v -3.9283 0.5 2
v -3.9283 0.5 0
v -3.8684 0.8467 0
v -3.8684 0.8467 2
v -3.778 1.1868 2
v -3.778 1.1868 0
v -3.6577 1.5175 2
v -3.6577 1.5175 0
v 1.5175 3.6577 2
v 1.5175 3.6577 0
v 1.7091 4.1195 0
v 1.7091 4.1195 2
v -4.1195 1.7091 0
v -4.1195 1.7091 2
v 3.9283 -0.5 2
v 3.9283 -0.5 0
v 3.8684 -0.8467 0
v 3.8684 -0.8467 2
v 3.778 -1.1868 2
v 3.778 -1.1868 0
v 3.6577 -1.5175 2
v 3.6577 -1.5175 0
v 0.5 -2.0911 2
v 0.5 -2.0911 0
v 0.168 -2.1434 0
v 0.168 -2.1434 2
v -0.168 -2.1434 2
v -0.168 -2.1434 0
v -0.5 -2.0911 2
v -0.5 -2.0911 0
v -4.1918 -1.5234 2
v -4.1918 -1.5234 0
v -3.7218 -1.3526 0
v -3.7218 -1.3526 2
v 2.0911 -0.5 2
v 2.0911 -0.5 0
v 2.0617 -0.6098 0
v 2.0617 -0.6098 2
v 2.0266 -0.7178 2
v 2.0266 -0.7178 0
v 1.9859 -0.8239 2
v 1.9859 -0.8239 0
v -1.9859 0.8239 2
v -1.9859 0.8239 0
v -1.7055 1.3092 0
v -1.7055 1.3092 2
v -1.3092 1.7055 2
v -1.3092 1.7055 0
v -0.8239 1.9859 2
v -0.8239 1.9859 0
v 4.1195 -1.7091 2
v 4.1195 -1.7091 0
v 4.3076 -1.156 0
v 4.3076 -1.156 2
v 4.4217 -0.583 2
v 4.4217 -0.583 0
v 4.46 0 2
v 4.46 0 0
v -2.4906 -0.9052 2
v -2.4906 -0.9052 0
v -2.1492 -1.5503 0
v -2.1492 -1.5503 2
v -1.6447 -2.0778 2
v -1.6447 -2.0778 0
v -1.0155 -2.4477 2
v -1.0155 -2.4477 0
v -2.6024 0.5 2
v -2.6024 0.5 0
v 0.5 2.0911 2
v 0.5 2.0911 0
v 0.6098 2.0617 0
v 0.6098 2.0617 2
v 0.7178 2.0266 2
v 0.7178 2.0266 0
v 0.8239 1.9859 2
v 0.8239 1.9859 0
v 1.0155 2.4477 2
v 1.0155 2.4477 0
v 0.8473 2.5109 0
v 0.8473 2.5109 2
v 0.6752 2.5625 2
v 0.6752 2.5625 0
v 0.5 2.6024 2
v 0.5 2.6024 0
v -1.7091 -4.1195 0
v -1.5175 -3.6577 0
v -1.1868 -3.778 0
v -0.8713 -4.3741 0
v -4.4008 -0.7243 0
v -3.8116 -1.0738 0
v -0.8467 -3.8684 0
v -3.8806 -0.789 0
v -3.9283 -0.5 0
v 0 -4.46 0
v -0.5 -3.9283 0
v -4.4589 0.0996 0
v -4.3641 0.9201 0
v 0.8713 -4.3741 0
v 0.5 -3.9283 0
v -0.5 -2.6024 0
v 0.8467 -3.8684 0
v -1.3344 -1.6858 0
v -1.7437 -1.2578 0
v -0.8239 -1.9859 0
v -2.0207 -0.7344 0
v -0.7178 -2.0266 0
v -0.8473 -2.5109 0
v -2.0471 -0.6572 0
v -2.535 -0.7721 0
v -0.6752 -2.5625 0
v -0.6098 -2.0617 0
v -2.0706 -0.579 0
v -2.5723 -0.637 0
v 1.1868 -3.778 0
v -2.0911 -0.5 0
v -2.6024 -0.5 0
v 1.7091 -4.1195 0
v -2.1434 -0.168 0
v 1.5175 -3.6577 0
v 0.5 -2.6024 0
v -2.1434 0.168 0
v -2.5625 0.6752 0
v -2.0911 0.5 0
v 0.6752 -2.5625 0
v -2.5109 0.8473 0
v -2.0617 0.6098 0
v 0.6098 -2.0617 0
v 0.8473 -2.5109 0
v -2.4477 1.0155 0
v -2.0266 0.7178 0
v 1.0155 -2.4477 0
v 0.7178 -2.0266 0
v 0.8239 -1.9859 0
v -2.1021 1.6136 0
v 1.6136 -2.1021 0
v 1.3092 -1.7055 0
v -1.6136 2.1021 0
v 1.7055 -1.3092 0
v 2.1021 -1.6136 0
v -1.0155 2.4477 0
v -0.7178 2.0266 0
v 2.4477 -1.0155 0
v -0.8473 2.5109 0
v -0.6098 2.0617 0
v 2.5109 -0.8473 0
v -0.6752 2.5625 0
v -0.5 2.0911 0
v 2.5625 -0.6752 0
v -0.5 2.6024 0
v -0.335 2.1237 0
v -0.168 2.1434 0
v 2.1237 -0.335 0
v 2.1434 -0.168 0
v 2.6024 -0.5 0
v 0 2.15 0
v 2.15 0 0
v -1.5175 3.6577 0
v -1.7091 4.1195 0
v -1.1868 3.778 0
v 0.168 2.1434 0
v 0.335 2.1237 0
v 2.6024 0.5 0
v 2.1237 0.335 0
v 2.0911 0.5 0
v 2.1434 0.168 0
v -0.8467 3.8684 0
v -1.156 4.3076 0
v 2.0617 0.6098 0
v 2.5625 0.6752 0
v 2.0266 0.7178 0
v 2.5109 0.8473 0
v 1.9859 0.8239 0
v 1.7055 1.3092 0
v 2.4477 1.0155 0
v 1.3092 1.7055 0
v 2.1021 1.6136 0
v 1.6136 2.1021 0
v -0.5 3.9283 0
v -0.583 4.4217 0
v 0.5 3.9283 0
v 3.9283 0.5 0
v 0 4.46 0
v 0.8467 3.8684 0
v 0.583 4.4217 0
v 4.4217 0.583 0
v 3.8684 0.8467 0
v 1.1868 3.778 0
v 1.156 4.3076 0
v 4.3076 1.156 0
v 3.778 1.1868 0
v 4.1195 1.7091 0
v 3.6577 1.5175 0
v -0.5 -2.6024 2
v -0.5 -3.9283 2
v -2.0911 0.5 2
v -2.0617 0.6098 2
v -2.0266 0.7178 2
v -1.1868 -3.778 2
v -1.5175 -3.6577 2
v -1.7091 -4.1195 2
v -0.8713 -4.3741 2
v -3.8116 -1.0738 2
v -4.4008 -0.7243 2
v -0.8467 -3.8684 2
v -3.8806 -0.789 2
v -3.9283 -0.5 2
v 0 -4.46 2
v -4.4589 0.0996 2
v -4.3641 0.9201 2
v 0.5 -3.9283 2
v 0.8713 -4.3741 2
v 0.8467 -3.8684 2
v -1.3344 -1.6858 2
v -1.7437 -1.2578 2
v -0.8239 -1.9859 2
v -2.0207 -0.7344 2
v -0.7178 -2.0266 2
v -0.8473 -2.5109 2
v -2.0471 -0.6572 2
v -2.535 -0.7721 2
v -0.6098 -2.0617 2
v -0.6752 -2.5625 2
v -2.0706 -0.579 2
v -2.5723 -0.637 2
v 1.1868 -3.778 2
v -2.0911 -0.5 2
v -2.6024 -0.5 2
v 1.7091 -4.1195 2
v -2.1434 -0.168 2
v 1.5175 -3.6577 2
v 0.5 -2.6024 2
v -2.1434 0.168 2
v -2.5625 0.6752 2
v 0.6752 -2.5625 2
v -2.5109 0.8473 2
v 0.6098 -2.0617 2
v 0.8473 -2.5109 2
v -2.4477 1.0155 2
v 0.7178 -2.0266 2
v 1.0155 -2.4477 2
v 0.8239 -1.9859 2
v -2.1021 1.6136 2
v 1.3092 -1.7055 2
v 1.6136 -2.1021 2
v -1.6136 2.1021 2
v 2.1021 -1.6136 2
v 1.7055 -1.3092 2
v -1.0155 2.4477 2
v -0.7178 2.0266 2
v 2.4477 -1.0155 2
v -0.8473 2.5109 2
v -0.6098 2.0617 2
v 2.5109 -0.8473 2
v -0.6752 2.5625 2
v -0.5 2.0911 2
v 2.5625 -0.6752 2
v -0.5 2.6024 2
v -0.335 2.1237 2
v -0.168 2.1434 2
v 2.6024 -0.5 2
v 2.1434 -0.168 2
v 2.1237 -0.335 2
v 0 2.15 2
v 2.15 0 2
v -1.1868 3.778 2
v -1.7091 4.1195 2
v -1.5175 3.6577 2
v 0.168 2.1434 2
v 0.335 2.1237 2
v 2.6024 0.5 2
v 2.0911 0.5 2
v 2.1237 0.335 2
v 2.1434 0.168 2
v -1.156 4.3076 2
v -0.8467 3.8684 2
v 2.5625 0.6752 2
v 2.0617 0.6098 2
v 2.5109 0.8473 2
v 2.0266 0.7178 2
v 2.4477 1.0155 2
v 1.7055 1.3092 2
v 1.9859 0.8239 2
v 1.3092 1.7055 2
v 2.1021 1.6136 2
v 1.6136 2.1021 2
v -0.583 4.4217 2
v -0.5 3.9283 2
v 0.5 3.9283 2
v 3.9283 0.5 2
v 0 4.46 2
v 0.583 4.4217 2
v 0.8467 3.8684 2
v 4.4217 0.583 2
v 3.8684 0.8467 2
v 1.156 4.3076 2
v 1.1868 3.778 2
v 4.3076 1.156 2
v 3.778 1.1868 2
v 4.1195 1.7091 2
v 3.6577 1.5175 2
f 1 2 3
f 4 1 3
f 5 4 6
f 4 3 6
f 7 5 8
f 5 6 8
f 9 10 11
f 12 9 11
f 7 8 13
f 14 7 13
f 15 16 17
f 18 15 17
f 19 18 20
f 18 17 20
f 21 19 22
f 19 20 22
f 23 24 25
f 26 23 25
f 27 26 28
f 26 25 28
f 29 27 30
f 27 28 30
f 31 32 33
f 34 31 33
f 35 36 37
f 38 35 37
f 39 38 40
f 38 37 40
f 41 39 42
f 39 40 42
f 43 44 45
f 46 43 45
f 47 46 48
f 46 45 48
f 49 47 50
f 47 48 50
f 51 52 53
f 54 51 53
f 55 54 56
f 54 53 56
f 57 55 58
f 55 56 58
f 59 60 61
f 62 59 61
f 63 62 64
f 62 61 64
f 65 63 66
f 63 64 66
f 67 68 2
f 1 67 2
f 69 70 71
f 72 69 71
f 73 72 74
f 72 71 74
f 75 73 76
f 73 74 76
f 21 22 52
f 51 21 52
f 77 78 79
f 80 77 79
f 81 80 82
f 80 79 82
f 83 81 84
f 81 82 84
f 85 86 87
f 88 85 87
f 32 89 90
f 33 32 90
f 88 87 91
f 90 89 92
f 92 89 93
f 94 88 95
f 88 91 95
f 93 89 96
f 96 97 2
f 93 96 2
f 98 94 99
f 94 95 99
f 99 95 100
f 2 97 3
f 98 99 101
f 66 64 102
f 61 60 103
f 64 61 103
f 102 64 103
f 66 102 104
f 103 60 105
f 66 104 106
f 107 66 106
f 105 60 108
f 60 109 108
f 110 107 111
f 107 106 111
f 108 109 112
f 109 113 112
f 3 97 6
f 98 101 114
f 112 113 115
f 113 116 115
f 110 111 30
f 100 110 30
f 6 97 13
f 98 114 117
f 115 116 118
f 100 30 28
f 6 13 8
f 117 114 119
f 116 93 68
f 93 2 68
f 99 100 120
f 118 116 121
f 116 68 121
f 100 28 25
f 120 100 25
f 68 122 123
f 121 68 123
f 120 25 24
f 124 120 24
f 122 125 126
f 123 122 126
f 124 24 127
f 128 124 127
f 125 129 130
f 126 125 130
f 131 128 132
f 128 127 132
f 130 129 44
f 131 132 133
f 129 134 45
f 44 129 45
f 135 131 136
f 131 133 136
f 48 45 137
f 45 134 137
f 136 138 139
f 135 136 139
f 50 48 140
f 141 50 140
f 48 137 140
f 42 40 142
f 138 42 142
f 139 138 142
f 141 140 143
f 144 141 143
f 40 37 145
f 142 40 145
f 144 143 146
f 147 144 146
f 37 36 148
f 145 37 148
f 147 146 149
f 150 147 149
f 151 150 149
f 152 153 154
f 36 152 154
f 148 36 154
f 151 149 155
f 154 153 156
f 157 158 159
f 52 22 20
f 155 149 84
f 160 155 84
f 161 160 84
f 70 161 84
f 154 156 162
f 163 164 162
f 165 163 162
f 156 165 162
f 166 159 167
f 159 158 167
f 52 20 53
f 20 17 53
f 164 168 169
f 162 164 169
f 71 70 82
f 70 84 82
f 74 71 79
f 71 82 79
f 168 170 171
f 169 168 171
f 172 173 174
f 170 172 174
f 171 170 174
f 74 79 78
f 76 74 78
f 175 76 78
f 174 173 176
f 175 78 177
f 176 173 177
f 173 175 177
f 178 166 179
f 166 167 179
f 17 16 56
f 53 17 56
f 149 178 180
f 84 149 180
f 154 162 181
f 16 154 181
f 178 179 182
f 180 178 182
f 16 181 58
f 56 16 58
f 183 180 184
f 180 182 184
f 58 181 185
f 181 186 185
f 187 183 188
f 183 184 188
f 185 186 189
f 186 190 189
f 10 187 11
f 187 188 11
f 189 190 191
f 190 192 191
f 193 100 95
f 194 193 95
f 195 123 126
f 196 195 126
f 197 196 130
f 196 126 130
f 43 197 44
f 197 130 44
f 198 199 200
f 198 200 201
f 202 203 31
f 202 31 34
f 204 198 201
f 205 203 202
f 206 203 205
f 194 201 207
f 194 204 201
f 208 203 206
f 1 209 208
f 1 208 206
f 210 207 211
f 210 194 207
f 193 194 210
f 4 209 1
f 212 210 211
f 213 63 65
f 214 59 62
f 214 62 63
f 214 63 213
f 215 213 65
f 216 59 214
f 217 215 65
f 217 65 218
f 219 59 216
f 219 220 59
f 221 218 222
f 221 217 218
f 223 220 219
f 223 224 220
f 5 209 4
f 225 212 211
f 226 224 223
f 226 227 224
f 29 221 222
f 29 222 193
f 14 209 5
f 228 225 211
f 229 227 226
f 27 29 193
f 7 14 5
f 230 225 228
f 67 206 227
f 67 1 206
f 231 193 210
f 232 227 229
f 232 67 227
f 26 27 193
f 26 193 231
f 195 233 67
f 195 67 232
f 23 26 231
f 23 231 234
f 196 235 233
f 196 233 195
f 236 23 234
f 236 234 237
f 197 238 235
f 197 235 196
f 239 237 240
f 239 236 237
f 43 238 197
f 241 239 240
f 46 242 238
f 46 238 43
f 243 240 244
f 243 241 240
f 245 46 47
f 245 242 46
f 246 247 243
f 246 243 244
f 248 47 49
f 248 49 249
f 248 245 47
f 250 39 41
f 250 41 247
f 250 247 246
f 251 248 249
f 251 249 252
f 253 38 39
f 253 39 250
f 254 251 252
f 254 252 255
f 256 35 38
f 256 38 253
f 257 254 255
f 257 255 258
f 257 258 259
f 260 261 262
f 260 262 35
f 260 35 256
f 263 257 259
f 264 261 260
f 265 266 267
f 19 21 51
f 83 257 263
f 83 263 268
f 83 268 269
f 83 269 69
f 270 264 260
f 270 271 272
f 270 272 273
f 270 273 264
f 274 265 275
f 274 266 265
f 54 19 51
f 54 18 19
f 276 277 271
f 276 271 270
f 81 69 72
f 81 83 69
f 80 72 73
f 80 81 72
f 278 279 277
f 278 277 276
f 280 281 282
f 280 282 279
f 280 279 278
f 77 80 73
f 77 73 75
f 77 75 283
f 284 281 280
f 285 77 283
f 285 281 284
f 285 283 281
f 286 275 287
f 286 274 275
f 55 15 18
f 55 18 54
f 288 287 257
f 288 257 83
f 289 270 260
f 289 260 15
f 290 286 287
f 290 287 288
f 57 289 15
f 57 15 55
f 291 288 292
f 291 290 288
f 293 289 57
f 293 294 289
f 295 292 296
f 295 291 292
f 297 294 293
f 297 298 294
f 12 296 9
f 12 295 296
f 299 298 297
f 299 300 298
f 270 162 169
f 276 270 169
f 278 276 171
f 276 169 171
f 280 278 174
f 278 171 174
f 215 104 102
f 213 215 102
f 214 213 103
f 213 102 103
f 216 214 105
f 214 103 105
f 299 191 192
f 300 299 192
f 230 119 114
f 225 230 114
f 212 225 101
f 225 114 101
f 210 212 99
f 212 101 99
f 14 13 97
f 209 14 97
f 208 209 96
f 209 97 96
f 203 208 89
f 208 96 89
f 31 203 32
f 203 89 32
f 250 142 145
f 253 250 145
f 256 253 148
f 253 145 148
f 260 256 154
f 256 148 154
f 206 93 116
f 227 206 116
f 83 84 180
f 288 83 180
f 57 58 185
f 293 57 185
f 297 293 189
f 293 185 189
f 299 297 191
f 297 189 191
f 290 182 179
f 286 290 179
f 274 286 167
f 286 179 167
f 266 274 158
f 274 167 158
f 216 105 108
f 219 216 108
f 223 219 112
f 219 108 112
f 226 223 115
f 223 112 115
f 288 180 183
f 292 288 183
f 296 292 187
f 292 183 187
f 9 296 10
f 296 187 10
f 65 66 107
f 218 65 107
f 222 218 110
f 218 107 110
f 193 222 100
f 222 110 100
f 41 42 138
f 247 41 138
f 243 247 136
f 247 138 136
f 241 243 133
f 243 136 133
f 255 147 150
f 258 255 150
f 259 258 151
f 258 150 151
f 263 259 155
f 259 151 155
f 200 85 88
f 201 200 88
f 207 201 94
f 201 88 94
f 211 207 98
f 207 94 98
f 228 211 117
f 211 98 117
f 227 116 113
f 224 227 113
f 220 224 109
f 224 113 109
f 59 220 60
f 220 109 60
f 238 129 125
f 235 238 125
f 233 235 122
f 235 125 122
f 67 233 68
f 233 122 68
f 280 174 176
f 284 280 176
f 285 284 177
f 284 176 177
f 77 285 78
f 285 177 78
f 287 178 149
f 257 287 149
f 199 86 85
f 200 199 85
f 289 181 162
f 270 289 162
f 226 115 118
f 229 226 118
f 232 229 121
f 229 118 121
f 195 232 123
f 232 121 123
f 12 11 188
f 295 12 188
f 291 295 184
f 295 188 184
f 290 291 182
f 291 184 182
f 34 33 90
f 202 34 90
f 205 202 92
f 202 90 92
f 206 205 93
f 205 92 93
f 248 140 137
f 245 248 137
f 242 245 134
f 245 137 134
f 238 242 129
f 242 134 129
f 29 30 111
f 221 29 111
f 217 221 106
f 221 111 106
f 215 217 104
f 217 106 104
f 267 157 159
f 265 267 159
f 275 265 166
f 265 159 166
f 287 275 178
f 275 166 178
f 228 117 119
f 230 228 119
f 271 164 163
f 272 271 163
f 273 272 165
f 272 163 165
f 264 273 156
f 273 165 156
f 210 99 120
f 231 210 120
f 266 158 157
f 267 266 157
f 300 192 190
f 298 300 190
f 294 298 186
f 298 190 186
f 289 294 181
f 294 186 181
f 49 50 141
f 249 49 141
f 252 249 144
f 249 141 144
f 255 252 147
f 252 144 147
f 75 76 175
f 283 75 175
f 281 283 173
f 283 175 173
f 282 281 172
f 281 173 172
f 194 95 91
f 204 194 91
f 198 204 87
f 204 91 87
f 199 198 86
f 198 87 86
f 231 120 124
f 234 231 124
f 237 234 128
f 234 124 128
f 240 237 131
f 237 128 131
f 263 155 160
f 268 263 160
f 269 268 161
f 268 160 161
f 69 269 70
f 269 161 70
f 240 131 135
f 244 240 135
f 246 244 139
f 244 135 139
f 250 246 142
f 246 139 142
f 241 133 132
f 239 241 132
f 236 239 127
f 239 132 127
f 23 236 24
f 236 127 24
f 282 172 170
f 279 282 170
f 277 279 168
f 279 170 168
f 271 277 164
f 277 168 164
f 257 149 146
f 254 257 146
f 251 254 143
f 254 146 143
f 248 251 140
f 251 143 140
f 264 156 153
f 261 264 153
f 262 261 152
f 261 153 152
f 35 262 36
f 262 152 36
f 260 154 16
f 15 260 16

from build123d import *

# Parameters (mm, degrees)
F1_DEPTH = 2


with BuildPart() as f1:
    # F0 (on Top) → F1 (new body)
    with BuildSketch(Plane.XY):
        with BuildLine():
            ThreePointArc((0.5, 3.9283075236), (1.0177847027, 3.8269719491), (1.5175023316, 3.6577023763))
            Line((1.5175023316, 3.6577023763), (1.7091061614, 4.1195334844))
            ThreePointArc((1.7091061614, 4.1195334844), (0.871343979, 4.3740552889), (0, 4.46))
            Line((0, 4.46), (0, 3.96))
            ThreePointArc((0, 3.96), (0.2505017031, 3.9520689388), (0.5, 3.9283075236))
        make_face()
        with BuildLine():
            ThreePointArc((-0.5, 3.9283075236), (-0.2505017031, 3.9520689388), (0, 3.96))
            Line((0, 3.96), (0, 4.46))
            ThreePointArc((0, 4.46), (-0.871343979, 4.3740552889), (-1.7091061614, 4.1195334844))
            Line((-1.7091061614, 4.1195334844), (-1.5175023316, 3.6577023763))
            ThreePointArc((-1.5175023316, 3.6577023763), (-1.0177847027, 3.8269719491), (-0.5, 3.9283075236))
        make_face()
        with BuildLine():
            ThreePointArc((-0.5, 2.6024027359), (-0.2511301951, 2.6380738475), (0, 2.65))
            Line((0, 2.65), (0, 3.96))
            ThreePointArc((0, 3.96), (-0.2505017031, 3.9520689388), (-0.5, 3.9283075236))
            Line((-0.5, 3.9283075236), (-0.5, 2.6024027359))
        make_face()
        with BuildLine():
            ThreePointArc((0, 2.65), (0.2511301951, 2.6380738475), (0.5, 2.6024027359))
            Line((0.5, 2.6024027359), (0.5, 3.9283075236))
            ThreePointArc((0.5, 3.9283075236), (0.2505017031, 3.9520689388), (0, 3.96))
            Line((0, 3.96), (0, 2.65))
        make_face()
        with BuildLine():
            ThreePointArc((0, 2.15), (0.2517314161, 2.1352122363), (0.5, 2.0910523666))
            Line((0.5, 2.0910523666), (0.5, 2.6024027359))
            ThreePointArc((0.5, 2.6024027359), (0.2511301951, 2.6380738475), (0, 2.65))
            Line((0, 2.65), (0, 2.15))
        make_face()
        with BuildLine():
            ThreePointArc((-0.5, 2.0910523666), (-0.2517314161, 2.1352122363), (0, 2.15))
            Line((0, 2.15), (0, 2.65))
            ThreePointArc((0, 2.65), (-0.2511301951, 2.6380738475), (-0.5, 2.6024027359))
            Line((-0.5, 2.6024027359), (-0.5, 2.0910523666))
        make_face()
        with BuildLine():
            ThreePointArc((-0.8238964679, 1.9858737649), (-0.6640339592, 2.0448860362), (-0.5, 2.0910523666))
            Line((-0.5, 2.0910523666), (-0.5, 2.6024027359))
            ThreePointArc((-0.5, 2.6024027359), (-0.7616876954, 2.5381749063), (-1.0155002977, 2.447704873))
            Line((-1.0155002977, 2.447704873), (-0.8238964679, 1.9858737649))
        make_face()
        with BuildLine():
            ThreePointArc((0.5, 2.0910523666), (0.6640339592, 2.0448860362), (0.8238964679, 1.9858737649))
            Line((0.8238964679, 1.9858737649), (1.0155002977, 2.447704873))
            ThreePointArc((1.0155002977, 2.447704873), (0.7616876954, 2.5381749063), (0.5, 2.6024027359))
            Line((0.5, 2.6024027359), (0.5, 2.0910523666))
        make_face()
        with BuildLine():
            ThreePointArc((0.8238964679, 1.9858737649), (1.5202795796, 1.5202795796), (1.9858737649, 0.8238964679))
            Line((1.9858737649, 0.8238964679), (2.447704873, 1.0155002977))
            ThreePointArc((2.447704873, 1.0155002977), (1.8738329701, 1.8738329701), (1.0155002977, 2.447704873))
            Line((1.0155002977, 2.447704873), (0.8238964679, 1.9858737649))
        make_face()
        with BuildLine():
            ThreePointArc((-1.9858737649, 0.8238964679), (-1.5202795796, 1.5202795796), (-0.8238964679, 1.9858737649))
            Line((-0.8238964679, 1.9858737649), (-1.0155002977, 2.447704873))
            ThreePointArc((-1.0155002977, 2.447704873), (-1.8738329701, 1.8738329701), (-2.447704873, 1.0155002977))
            Line((-2.447704873, 1.0155002977), (-1.9858737649, 0.8238964679))
        make_face()
        with BuildLine():
            ThreePointArc((-2.0910523666, 0.5), (-2.0448860362, 0.6640339592), (-1.9858737649, 0.8238964679))
            Line((-1.9858737649, 0.8238964679), (-2.447704873, 1.0155002977))
            ThreePointArc((-2.447704873, 1.0155002977), (-2.5381749063, 0.7616876954), (-2.6024027359, 0.5))
            Line((-2.6024027359, 0.5), (-2.0910523666, 0.5))
        make_face()
        with BuildLine():
            Line((-2.6024027359, -0.5), (-2.0910523666, -0.5))
            ThreePointArc((-2.0910523666, -0.5), (-2.15, 0), (-2.0910523666, 0.5))
            Line((-2.0910523666, 0.5), (-2.6024027359, 0.5))
            ThreePointArc((-2.6024027359, 0.5), (-2.65, 0), (-2.6024027359, -0.5))
        make_face()
        with BuildLine():
            Line((-2.4906162885, -0.9051687706), (-2.0206886869, -0.7343822101))
            ThreePointArc((-2.0206886869, -0.7343822101), (-2.0592079492, -0.6181930297), (-2.0910523666, -0.5))
            Line((-2.0910523666, -0.5), (-2.6024027359, -0.5))
            ThreePointArc((-2.6024027359, -0.5), (-2.5545549767, -0.7048041366), (-2.4906162885, -0.9051687706))
        make_face()
        with BuildLine():
            Line((-1.0155002977, -2.447704873), (-0.8238964679, -1.9858737649))
            ThreePointArc((-0.8238964679, -1.9858737649), (-1.553857765, -1.4859428139), (-2.0206886869, -0.7343822101))
            Line((-2.0206886869, -0.7343822101), (-2.4906162885, -0.9051687706))
            ThreePointArc((-2.4906162885, -0.9051687706), (-1.9152200359, -1.8315109102), (-1.0155002977, -2.447704873))
        make_face()
        with BuildLine():
            Line((-0.5, -2.6024027359), (-0.5, -2.0910523666))
            ThreePointArc((-0.5, -2.0910523666), (-0.6640339592, -2.0448860362), (-0.8238964679, -1.9858737649))
            Line((-0.8238964679, -1.9858737649), (-1.0155002977, -2.447704873))
            ThreePointArc((-1.0155002977, -2.447704873), (-0.7616876954, -2.5381749063), (-0.5, -2.6024027359))
        make_face()
        with BuildLine():
            Line((0.5, -2.6024027359), (0.5, -2.0910523666))
            ThreePointArc((0.5, -2.0910523666), (0, -2.15), (-0.5, -2.0910523666))
            Line((-0.5, -2.0910523666), (-0.5, -2.6024027359))
            ThreePointArc((-0.5, -2.6024027359), (0, -2.65), (0.5, -2.6024027359))
        make_face()
        with BuildLine():
            Line((1.0155002977, -2.447704873), (0.8238964679, -1.9858737649))
            ThreePointArc((0.8238964679, -1.9858737649), (0.6640339592, -2.0448860362), (0.5, -2.0910523666))
            Line((0.5, -2.0910523666), (0.5, -2.6024027359))
            ThreePointArc((0.5, -2.6024027359), (0.7616876954, -2.5381749063), (1.0155002977, -2.447704873))
        make_face()
        with BuildLine():
            Line((2.447704873, -1.0155002977), (1.9858737649, -0.8238964679))
            ThreePointArc((1.9858737649, -0.8238964679), (1.5202795796, -1.5202795796), (0.8238964679, -1.9858737649))
            Line((0.8238964679, -1.9858737649), (1.0155002977, -2.447704873))
            ThreePointArc((1.0155002977, -2.447704873), (1.8738329701, -1.8738329701), (2.447704873, -1.0155002977))
        make_face()
        with BuildLine():
            Line((2.6024027359, -0.5), (2.0910523666, -0.5))
            ThreePointArc((2.0910523666, -0.5), (2.0448860362, -0.6640339592), (1.9858737649, -0.8238964679))
            Line((1.9858737649, -0.8238964679), (2.447704873, -1.0155002977))
            ThreePointArc((2.447704873, -1.0155002977), (2.5381749063, -0.7616876954), (2.6024027359, -0.5))
        make_face()
        with BuildLine():
            ThreePointArc((2.0910523666, 0.5), (2.1352122363, 0.2517314161), (2.15, 0))
            ThreePointArc((2.15, 0), (2.1352122363, -0.2517314161), (2.0910523666, -0.5))
            Line((2.0910523666, -0.5), (2.6024027359, -0.5))
            ThreePointArc((2.6024027359, -0.5), (2.6380738475, -0.2511301951), (2.65, 0))
            ThreePointArc((2.65, 0), (2.6380738475, 0.2511301951), (2.6024027359, 0.5))
            Line((2.6024027359, 0.5), (2.0910523666, 0.5))
        make_face()
        with BuildLine():
            ThreePointArc((1.9858737649, 0.8238964679), (2.0448860362, 0.6640339592), (2.0910523666, 0.5))
            Line((2.0910523666, 0.5), (2.6024027359, 0.5))
            ThreePointArc((2.6024027359, 0.5), (2.5381749063, 0.7616876954), (2.447704873, 1.0155002977))
            Line((2.447704873, 1.0155002977), (1.9858737649, 0.8238964679))
        make_face()
        with BuildLine():
            Line((3.9283075236, 0.5), (2.6024027359, 0.5))
            ThreePointArc((2.6024027359, 0.5), (2.6380738475, 0.2511301951), (2.65, 0))
            ThreePointArc((2.65, 0), (2.6380738475, -0.2511301951), (2.6024027359, -0.5))
            Line((2.6024027359, -0.5), (3.9283075236, -0.5))
            ThreePointArc((3.9283075236, -0.5), (3.9520689388, -0.2505017031), (3.96, 0))
            ThreePointArc((3.96, 0), (3.9520689388, 0.2505017031), (3.9283075236, 0.5))
        make_face()
        with BuildLine():
            ThreePointArc((3.6577023763, 1.5175023316), (3.8269719491, 1.0177847027), (3.9283075236, 0.5))
            ThreePointArc((3.9283075236, 0.5), (3.9520689388, 0.2505017031), (3.96, 0))
            ThreePointArc((3.96, 0), (3.9520689388, -0.2505017031), (3.9283075236, -0.5))
            ThreePointArc((3.9283075236, -0.5), (3.8269719491, -1.0177847027), (3.6577023763, -1.5175023316))
            Line((3.6577023763, -1.5175023316), (4.1195334844, -1.7091061614))
            ThreePointArc((4.1195334844, -1.7091061614), (4.3740552889, -0.871343979), (4.46, 0))
            ThreePointArc((4.46, 0), (4.3740552889, 0.871343979), (4.1195334844, 1.7091061614))
            Line((4.1195334844, 1.7091061614), (3.6577023763, 1.5175023316))
        make_face()
        with BuildLine():
            Line((-3.9283075236, -0.5), (-2.6024027359, -0.5))
            ThreePointArc((-2.6024027359, -0.5), (-2.65, 0), (-2.6024027359, 0.5))
            Line((-2.6024027359, 0.5), (-3.9283075236, 0.5))
            ThreePointArc((-3.9283075236, 0.5), (-3.96, 0), (-3.9283075236, -0.5))
        make_face()
        with BuildLine():
            ThreePointArc((-4.1195334844, 1.7091061614), (-4.4588872876, 0.0996200586), (-4.1917542064, -1.5234161196))
            Line((-4.1917542064, -1.5234161196), (-3.7218266048, -1.3526295591))
            ThreePointArc((-3.7218266048, -1.3526295591), (-3.8487507501, -0.9320502472), (-3.9283075236, -0.5))
            ThreePointArc((-3.9283075236, -0.5), (-3.96, 0), (-3.9283075236, 0.5))
            ThreePointArc((-3.9283075236, 0.5), (-3.8269719491, 1.0177847027), (-3.6577023763, 1.5175023316))
            Line((-3.6577023763, 1.5175023316), (-4.1195334844, 1.7091061614))
        make_face()
        with BuildLine():
            Line((0.5, -3.9283075236), (0.5, -2.6024027359))
            ThreePointArc((0.5, -2.6024027359), (0, -2.65), (-0.5, -2.6024027359))
            Line((-0.5, -2.6024027359), (-0.5, -3.9283075236))
            ThreePointArc((-0.5, -3.9283075236), (0, -3.96), (0.5, -3.9283075236))
        make_face()
        with BuildLine():
            Line((1.7091061614, -4.1195334844), (1.5175023316, -3.6577023763))
            ThreePointArc((1.5175023316, -3.6577023763), (1.0177847027, -3.8269719491), (0.5, -3.9283075236))
            ThreePointArc((0.5, -3.9283075236), (0, -3.96), (-0.5, -3.9283075236))
            ThreePointArc((-0.5, -3.9283075236), (-1.0177847027, -3.8269719491), (-1.5175023316, -3.6577023763))
            Line((-1.5175023316, -3.6577023763), (-1.7091061614, -4.1195334844))
            ThreePointArc((-1.7091061614, -4.1195334844), (0, -4.46), (1.7091061614, -4.1195334844))
        make_face()
    extrude(amount=F1_DEPTH)


solid = f1.part
